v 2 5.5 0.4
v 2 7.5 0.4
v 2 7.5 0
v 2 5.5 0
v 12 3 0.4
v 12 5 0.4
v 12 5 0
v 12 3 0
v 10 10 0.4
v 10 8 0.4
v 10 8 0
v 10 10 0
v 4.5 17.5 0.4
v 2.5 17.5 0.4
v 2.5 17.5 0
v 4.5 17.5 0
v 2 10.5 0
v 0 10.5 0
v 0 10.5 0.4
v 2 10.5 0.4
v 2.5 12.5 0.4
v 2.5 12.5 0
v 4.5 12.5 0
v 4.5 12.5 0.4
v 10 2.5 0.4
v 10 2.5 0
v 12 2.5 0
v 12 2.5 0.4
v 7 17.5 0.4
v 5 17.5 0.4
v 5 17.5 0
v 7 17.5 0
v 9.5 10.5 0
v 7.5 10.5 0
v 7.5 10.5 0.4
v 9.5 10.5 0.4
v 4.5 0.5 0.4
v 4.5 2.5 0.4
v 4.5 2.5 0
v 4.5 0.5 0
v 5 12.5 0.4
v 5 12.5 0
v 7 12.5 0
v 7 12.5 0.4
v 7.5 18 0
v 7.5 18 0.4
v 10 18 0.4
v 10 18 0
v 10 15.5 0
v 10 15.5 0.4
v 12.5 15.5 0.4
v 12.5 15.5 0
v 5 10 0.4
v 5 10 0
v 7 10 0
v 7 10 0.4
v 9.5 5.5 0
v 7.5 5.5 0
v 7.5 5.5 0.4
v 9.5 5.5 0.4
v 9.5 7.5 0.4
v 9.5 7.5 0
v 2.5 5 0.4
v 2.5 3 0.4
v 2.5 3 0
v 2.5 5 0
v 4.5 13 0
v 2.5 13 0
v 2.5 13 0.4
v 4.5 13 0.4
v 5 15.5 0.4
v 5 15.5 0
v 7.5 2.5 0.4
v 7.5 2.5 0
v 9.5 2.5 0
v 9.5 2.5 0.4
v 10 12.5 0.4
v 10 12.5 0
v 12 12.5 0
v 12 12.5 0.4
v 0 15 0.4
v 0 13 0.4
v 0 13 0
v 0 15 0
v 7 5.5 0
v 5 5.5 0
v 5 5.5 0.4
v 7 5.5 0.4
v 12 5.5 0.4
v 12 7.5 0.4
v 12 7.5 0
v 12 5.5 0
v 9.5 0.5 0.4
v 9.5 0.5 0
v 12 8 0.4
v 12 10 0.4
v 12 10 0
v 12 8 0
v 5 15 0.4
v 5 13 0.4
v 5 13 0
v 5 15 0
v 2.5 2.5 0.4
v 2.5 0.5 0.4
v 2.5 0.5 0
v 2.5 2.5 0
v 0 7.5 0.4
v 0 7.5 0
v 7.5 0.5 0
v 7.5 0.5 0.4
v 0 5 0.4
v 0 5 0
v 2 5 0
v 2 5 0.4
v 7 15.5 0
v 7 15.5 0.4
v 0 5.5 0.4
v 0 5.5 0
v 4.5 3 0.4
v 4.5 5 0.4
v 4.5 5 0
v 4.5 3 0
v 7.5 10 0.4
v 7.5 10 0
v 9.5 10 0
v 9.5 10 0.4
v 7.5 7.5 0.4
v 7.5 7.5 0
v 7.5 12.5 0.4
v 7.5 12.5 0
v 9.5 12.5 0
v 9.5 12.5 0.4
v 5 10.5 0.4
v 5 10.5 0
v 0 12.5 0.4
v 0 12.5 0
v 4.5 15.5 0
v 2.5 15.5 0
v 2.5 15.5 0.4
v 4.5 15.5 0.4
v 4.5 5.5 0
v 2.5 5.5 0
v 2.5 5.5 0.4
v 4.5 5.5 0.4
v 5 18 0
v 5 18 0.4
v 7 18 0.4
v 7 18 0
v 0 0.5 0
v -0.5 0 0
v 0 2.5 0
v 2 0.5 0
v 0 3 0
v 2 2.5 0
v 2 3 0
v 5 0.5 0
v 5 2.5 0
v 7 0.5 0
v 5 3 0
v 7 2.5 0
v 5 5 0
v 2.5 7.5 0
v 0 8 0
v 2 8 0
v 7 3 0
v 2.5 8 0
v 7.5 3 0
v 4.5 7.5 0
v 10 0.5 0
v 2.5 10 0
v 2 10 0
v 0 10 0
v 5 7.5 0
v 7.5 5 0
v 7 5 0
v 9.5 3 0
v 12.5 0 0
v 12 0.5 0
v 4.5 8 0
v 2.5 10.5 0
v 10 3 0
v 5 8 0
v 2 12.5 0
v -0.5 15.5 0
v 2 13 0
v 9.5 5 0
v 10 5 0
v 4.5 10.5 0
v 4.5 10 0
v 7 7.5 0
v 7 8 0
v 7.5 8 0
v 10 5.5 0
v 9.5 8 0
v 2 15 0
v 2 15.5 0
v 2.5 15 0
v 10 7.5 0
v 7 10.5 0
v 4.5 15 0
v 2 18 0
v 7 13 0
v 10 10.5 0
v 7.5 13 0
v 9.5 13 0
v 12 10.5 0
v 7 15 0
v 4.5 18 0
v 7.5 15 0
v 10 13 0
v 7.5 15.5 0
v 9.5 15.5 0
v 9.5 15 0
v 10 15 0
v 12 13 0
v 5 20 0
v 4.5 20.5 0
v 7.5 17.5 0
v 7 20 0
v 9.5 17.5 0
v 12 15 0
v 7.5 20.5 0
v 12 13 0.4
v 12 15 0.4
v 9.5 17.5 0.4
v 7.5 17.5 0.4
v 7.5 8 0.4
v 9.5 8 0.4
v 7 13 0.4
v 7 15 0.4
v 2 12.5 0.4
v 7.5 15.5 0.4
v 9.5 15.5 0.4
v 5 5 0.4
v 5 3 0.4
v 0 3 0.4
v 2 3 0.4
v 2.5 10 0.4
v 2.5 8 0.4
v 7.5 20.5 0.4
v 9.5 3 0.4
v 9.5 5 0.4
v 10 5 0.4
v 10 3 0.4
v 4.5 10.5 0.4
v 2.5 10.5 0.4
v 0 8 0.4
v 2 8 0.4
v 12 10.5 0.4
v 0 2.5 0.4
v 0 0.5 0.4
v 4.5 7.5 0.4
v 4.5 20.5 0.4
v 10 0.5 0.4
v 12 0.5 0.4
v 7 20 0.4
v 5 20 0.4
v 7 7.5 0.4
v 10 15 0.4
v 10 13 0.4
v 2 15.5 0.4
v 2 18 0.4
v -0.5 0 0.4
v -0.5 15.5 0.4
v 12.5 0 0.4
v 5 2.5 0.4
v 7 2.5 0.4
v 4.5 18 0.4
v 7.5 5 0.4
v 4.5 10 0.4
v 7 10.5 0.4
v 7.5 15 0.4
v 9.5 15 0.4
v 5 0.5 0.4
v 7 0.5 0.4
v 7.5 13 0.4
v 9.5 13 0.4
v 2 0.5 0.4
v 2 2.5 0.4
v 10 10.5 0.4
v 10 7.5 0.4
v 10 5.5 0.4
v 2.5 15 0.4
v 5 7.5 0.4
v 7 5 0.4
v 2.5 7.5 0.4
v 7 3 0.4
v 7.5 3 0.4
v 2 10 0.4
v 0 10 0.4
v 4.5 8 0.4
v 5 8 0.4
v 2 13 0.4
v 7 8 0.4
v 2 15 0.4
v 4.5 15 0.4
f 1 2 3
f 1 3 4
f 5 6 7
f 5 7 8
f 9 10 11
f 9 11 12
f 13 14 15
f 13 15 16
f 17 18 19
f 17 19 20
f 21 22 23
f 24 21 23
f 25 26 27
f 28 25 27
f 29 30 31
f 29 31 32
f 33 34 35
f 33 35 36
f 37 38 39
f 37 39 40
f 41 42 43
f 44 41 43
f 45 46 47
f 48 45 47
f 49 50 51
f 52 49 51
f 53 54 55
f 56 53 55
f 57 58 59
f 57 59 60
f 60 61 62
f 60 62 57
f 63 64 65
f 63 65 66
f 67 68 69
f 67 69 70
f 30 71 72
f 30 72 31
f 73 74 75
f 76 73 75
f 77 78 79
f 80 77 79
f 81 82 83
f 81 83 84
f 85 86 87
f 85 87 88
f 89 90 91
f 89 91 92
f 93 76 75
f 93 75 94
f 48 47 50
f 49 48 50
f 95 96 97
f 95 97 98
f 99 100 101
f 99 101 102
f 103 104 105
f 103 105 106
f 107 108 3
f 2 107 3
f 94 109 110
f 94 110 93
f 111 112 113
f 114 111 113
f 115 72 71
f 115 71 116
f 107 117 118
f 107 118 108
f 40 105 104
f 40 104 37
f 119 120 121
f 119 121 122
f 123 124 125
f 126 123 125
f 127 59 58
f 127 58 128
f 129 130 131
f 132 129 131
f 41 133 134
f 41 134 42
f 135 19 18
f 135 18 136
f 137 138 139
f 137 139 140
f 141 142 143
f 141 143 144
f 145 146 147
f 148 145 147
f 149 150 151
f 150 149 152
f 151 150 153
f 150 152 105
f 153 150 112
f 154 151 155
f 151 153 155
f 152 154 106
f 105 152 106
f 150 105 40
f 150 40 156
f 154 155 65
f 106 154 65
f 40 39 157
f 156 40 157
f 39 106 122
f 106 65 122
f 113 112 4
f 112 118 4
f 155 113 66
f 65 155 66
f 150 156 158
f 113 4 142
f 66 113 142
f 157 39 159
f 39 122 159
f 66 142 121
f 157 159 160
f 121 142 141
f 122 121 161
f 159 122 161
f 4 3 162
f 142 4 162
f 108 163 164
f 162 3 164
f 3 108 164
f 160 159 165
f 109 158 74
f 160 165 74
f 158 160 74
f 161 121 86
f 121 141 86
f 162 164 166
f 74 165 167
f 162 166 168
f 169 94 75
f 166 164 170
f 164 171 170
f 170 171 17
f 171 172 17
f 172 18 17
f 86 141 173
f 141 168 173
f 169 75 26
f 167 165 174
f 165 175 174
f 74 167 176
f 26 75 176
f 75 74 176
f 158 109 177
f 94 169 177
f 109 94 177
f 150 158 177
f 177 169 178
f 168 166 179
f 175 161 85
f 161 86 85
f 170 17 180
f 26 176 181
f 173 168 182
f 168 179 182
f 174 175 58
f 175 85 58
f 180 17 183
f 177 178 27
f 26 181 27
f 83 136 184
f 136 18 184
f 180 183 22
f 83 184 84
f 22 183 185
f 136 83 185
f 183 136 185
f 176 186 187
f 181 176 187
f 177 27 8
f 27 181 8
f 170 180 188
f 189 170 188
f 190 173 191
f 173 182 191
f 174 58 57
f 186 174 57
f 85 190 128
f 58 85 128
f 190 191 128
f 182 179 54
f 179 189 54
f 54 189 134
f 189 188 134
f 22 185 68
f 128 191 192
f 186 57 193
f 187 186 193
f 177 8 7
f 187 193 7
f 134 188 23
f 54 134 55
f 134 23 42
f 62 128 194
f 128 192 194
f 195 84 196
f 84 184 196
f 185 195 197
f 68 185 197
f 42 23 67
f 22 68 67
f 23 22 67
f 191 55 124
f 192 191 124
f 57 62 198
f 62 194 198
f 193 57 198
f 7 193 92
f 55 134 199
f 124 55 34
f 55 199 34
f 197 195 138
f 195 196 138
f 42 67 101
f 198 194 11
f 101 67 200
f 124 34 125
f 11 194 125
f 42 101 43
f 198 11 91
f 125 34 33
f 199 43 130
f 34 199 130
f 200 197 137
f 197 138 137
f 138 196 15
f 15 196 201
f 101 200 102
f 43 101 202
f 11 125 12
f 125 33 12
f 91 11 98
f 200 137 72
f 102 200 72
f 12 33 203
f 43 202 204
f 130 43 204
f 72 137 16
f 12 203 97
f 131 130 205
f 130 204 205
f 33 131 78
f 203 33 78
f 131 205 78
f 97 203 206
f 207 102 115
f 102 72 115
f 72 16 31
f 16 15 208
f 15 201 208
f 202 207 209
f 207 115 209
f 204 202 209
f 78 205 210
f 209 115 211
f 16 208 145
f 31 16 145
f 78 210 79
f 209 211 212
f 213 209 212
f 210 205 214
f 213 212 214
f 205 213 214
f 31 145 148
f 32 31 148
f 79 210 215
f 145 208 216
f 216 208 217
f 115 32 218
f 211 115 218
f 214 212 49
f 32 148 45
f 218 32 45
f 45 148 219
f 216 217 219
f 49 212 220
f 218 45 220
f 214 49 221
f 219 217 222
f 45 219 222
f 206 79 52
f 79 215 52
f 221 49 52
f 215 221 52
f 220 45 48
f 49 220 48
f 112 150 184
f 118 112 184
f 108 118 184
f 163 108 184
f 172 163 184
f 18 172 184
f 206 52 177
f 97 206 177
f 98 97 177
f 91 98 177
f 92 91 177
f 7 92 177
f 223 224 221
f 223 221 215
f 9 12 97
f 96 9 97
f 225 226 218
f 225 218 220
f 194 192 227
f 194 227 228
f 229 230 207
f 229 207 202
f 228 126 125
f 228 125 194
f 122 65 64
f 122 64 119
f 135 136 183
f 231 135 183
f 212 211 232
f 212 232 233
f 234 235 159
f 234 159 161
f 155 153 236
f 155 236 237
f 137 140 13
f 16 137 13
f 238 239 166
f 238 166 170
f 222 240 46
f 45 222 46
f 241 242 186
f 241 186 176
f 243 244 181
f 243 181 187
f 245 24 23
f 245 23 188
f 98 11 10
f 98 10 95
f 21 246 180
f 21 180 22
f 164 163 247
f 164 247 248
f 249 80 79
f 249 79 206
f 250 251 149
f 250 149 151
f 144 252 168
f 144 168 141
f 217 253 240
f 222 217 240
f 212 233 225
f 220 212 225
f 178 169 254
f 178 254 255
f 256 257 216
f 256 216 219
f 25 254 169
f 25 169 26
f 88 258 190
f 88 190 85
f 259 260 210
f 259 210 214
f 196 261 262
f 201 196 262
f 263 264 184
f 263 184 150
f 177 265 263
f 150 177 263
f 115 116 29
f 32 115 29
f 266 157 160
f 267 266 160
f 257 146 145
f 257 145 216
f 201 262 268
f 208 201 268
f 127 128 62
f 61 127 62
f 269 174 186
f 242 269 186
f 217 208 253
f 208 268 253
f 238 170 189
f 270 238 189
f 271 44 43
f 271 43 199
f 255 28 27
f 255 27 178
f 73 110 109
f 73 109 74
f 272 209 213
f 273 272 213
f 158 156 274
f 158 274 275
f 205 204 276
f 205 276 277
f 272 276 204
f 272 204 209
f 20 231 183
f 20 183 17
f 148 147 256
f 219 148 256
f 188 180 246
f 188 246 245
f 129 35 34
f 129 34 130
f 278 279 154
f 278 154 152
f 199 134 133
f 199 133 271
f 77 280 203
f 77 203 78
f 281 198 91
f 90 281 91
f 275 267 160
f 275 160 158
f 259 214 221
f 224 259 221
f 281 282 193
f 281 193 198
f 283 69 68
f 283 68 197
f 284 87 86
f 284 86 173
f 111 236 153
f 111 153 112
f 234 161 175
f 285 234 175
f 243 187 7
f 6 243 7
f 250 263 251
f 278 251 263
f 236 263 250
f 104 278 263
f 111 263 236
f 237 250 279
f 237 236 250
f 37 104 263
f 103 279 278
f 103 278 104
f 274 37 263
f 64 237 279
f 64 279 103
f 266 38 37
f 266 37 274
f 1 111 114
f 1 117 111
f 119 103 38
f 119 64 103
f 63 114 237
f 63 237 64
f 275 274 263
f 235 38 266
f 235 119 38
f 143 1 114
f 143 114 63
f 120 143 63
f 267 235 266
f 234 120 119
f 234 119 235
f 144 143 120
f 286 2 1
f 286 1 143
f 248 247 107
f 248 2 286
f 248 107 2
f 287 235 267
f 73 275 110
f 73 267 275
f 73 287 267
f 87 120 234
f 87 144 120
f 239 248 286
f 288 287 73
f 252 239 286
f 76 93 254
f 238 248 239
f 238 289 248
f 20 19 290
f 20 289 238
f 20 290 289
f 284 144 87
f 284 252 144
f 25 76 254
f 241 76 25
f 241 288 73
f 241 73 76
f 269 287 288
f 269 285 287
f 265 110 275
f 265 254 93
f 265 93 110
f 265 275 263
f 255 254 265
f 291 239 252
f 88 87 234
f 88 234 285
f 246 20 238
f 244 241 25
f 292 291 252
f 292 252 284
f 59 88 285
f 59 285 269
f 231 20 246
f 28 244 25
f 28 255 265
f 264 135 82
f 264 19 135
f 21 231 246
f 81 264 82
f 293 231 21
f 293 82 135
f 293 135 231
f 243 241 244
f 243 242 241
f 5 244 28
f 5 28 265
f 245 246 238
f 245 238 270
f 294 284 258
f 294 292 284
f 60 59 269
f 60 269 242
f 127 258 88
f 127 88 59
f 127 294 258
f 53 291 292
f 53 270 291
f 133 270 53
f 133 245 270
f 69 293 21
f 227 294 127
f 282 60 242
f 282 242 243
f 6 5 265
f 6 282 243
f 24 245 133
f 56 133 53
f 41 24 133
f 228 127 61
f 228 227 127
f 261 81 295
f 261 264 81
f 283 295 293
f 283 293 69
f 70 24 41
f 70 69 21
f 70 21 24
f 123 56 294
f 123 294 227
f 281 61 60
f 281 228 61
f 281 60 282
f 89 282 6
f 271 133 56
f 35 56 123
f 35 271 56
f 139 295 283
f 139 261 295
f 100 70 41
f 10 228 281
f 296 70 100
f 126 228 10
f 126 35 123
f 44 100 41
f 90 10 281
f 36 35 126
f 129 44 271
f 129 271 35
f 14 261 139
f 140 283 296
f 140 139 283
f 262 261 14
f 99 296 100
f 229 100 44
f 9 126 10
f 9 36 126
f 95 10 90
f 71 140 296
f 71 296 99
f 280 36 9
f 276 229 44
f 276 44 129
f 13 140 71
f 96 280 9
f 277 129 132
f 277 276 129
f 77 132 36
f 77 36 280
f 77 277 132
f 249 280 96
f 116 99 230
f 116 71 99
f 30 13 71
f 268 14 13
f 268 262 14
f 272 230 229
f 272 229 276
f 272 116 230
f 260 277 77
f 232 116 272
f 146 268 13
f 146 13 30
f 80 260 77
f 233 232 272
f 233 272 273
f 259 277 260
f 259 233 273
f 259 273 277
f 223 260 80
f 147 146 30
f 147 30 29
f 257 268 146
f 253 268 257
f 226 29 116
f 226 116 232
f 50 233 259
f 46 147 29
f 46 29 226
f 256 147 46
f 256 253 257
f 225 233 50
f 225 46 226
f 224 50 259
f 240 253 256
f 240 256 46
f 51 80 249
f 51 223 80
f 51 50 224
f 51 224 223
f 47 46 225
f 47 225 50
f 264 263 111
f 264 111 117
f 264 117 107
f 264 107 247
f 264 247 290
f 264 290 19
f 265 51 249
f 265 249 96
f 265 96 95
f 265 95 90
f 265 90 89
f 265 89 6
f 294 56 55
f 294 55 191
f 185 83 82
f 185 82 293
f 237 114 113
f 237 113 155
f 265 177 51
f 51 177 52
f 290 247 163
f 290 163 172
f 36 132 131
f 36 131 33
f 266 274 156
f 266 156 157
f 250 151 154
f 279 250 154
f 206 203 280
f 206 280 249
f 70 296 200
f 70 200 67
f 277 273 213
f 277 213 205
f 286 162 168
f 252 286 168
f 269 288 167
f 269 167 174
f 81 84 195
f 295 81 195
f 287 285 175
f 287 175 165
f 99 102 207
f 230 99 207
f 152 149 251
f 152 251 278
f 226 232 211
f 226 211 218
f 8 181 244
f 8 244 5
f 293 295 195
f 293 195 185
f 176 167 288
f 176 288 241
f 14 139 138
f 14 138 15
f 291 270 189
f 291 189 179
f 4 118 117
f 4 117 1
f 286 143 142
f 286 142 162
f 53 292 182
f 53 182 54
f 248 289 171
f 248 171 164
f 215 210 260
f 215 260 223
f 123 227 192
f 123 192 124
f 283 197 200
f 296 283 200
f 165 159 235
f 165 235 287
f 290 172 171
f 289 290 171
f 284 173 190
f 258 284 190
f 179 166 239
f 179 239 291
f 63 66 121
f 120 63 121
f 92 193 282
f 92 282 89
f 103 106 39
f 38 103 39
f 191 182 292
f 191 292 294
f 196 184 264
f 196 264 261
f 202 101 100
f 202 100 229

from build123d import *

# Parameters (mm, degrees)
SKETCH_1_W             = 12.5
SKETCH_1_H             = 0.5
EXTRUDE_1_DEPTH        = 0.4
PATTERN_LINEAR_1_COUNT = 7
PATTERN_LINEAR_1_PITCH = 2.5
EXTRUDE_3_DEPTH        = 0.4
PATTERN_LINEAR_2_COUNT = 7
PATTERN_LINEAR_2_PITCH = 2.5
SKETCH_4_W             = 0.5
SKETCH_4_H             = 2.5
EXTRUDE_4_DEPTH        = 0.4
SKETCH_6_W             = 0.5
SKETCH_6_H             = 2.5
EXTRUDE_6_DEPTH        = 0.4
SKETCH_7_W             = 10.5
SKETCH_7_H             = 0.5
SKETCH_7_W_2           = 5.5
EXTRUDE_7_DEPTH        = 0.4
CUT_EXTRUDE_2_DEPTH    = 10


with BuildPart() as part:
    # Sketch 1 → Extrude 1 (new body)
    with BuildSketch(Plane.XY):
        with Locations((6.25, 0.25)):
            Rectangle(SKETCH_1_W, SKETCH_1_H)
    extrude(amount=EXTRUDE_1_DEPTH)


with BuildPart() as pattern_linear_1_1:
    # Pattern Linear 1: pattern copy
    add(part.part.moved(Location(Vector(0, 1, 0) * (1 * PATTERN_LINEAR_1_PITCH))))


with BuildPart() as pattern_linear_1_2:
    # Pattern Linear 1: pattern copy
    add(part.part.moved(Location(Vector(0, 1, 0) * (2 * PATTERN_LINEAR_1_PITCH))))


with BuildPart() as pattern_linear_1_3:
    # Pattern Linear 1: pattern copy
    add(part.part.moved(Location(Vector(0, 1, 0) * (3 * PATTERN_LINEAR_1_PITCH))))


with BuildPart() as pattern_linear_1_4:
    # Pattern Linear 1: pattern copy
    add(part.part.moved(Location(Vector(0, 1, 0) * (4 * PATTERN_LINEAR_1_PITCH))))


with BuildPart() as pattern_linear_1_5:
    # Pattern Linear 1: pattern copy
    add(part.part.moved(Location(Vector(0, 1, 0) * (5 * PATTERN_LINEAR_1_PITCH))))


with BuildPart() as pattern_linear_1_6:
    # Pattern Linear 1: pattern copy
    add(part.part.moved(Location(Vector(0, 1, 0) * (6 * PATTERN_LINEAR_1_PITCH))))

    # Sketch 4 → Extrude 4 (add)
    with BuildSketch(Plane.XY.offset(0.4)):
        with Locations((4.75, 16.75)):
            Rectangle(SKETCH_4_W, SKETCH_4_H)
        with Locations((2.25, 16.75)):
            Rectangle(SKETCH_4_W, SKETCH_4_H)
        with Locations((7.25, 16.75)):
            Rectangle(SKETCH_4_W, SKETCH_4_H)
        with Locations((9.75, 16.75)):
            Rectangle(SKETCH_4_W, SKETCH_4_H)
    extrude(amount=-EXTRUDE_4_DEPTH)

    # Sketch 6 → Extrude 6 (add)
    with BuildSketch(Plane.XY.offset(0.4)):
        with Locations((4.75, 19.25)):
            Rectangle(SKETCH_6_W, SKETCH_6_H)
        with Locations((9.75, 19.25)):
            Rectangle(SKETCH_6_W, SKETCH_6_H)
        with Locations((7.25, 19.25)):
            Rectangle(SKETCH_6_W, SKETCH_6_H)
    extrude(amount=-EXTRUDE_6_DEPTH)

    # Sketch 7 → Extrude 7 (add)
    with BuildSketch(Plane.XY.offset(0.4)):
        with Locations((7.25, 17.75)):
            Rectangle(SKETCH_7_W, SKETCH_7_H)
        with Locations((7.25, 20.25)):
            Rectangle(SKETCH_7_W_2, SKETCH_7_H)
    extrude(amount=-EXTRUDE_7_DEPTH)

    # Sketch 9 → Cut-Extrude 2 (cut)
    with BuildSketch(Plane.XY.offset(0.4)):
        Polygon((9.5, 18), (10, 18), (10, 15.5), (12.5, 15.5), (12.5, 20), (10, 20), (10, 20.5), (7.5, 20.5), (7.5, 20), (9.5, 20), align=None)
    extrude(amount=-CUT_EXTRUDE_2_DEPTH, mode=Mode.SUBTRACT)


with BuildPart() as part_1:
    add(part.part)

    add(pattern_linear_1_1.part)  # Extrude 3 merges Pattern Linear 1_1

    add(pattern_linear_1_2.part)  # Extrude 3 merges Pattern Linear 1_2

    add(pattern_linear_1_3.part)  # Extrude 3 merges Pattern Linear 1_3
    # Sketch 3 → Extrude 3 (add)
    with BuildSketch(Plane.XY.offset(0.4)):
        Polygon((0, 15.5), (0, 8), (0, 0), (-0.5, 0), (-0.5, 10.98507125), (-0.5, 15.5), align=None)
    extrude_3 = extrude(amount=-EXTRUDE_3_DEPTH)

    # Pattern Linear 2: Extrude 3 ×7, 1 skipped
    with Locations(*[(i * PATTERN_LINEAR_2_PITCH, 0, 0) for i in range(1, PATTERN_LINEAR_2_COUNT) if i not in (6,)]):
        add(extrude_3)

    # Combine 1: union Pattern Linear 1_5, Pattern Linear 1_4
    add(pattern_linear_1_5.part)
    add(pattern_linear_1_4.part)

    # Combine 2: union Pattern Linear 1_6
    add(pattern_linear_1_6.part)


solid = part_1.part
